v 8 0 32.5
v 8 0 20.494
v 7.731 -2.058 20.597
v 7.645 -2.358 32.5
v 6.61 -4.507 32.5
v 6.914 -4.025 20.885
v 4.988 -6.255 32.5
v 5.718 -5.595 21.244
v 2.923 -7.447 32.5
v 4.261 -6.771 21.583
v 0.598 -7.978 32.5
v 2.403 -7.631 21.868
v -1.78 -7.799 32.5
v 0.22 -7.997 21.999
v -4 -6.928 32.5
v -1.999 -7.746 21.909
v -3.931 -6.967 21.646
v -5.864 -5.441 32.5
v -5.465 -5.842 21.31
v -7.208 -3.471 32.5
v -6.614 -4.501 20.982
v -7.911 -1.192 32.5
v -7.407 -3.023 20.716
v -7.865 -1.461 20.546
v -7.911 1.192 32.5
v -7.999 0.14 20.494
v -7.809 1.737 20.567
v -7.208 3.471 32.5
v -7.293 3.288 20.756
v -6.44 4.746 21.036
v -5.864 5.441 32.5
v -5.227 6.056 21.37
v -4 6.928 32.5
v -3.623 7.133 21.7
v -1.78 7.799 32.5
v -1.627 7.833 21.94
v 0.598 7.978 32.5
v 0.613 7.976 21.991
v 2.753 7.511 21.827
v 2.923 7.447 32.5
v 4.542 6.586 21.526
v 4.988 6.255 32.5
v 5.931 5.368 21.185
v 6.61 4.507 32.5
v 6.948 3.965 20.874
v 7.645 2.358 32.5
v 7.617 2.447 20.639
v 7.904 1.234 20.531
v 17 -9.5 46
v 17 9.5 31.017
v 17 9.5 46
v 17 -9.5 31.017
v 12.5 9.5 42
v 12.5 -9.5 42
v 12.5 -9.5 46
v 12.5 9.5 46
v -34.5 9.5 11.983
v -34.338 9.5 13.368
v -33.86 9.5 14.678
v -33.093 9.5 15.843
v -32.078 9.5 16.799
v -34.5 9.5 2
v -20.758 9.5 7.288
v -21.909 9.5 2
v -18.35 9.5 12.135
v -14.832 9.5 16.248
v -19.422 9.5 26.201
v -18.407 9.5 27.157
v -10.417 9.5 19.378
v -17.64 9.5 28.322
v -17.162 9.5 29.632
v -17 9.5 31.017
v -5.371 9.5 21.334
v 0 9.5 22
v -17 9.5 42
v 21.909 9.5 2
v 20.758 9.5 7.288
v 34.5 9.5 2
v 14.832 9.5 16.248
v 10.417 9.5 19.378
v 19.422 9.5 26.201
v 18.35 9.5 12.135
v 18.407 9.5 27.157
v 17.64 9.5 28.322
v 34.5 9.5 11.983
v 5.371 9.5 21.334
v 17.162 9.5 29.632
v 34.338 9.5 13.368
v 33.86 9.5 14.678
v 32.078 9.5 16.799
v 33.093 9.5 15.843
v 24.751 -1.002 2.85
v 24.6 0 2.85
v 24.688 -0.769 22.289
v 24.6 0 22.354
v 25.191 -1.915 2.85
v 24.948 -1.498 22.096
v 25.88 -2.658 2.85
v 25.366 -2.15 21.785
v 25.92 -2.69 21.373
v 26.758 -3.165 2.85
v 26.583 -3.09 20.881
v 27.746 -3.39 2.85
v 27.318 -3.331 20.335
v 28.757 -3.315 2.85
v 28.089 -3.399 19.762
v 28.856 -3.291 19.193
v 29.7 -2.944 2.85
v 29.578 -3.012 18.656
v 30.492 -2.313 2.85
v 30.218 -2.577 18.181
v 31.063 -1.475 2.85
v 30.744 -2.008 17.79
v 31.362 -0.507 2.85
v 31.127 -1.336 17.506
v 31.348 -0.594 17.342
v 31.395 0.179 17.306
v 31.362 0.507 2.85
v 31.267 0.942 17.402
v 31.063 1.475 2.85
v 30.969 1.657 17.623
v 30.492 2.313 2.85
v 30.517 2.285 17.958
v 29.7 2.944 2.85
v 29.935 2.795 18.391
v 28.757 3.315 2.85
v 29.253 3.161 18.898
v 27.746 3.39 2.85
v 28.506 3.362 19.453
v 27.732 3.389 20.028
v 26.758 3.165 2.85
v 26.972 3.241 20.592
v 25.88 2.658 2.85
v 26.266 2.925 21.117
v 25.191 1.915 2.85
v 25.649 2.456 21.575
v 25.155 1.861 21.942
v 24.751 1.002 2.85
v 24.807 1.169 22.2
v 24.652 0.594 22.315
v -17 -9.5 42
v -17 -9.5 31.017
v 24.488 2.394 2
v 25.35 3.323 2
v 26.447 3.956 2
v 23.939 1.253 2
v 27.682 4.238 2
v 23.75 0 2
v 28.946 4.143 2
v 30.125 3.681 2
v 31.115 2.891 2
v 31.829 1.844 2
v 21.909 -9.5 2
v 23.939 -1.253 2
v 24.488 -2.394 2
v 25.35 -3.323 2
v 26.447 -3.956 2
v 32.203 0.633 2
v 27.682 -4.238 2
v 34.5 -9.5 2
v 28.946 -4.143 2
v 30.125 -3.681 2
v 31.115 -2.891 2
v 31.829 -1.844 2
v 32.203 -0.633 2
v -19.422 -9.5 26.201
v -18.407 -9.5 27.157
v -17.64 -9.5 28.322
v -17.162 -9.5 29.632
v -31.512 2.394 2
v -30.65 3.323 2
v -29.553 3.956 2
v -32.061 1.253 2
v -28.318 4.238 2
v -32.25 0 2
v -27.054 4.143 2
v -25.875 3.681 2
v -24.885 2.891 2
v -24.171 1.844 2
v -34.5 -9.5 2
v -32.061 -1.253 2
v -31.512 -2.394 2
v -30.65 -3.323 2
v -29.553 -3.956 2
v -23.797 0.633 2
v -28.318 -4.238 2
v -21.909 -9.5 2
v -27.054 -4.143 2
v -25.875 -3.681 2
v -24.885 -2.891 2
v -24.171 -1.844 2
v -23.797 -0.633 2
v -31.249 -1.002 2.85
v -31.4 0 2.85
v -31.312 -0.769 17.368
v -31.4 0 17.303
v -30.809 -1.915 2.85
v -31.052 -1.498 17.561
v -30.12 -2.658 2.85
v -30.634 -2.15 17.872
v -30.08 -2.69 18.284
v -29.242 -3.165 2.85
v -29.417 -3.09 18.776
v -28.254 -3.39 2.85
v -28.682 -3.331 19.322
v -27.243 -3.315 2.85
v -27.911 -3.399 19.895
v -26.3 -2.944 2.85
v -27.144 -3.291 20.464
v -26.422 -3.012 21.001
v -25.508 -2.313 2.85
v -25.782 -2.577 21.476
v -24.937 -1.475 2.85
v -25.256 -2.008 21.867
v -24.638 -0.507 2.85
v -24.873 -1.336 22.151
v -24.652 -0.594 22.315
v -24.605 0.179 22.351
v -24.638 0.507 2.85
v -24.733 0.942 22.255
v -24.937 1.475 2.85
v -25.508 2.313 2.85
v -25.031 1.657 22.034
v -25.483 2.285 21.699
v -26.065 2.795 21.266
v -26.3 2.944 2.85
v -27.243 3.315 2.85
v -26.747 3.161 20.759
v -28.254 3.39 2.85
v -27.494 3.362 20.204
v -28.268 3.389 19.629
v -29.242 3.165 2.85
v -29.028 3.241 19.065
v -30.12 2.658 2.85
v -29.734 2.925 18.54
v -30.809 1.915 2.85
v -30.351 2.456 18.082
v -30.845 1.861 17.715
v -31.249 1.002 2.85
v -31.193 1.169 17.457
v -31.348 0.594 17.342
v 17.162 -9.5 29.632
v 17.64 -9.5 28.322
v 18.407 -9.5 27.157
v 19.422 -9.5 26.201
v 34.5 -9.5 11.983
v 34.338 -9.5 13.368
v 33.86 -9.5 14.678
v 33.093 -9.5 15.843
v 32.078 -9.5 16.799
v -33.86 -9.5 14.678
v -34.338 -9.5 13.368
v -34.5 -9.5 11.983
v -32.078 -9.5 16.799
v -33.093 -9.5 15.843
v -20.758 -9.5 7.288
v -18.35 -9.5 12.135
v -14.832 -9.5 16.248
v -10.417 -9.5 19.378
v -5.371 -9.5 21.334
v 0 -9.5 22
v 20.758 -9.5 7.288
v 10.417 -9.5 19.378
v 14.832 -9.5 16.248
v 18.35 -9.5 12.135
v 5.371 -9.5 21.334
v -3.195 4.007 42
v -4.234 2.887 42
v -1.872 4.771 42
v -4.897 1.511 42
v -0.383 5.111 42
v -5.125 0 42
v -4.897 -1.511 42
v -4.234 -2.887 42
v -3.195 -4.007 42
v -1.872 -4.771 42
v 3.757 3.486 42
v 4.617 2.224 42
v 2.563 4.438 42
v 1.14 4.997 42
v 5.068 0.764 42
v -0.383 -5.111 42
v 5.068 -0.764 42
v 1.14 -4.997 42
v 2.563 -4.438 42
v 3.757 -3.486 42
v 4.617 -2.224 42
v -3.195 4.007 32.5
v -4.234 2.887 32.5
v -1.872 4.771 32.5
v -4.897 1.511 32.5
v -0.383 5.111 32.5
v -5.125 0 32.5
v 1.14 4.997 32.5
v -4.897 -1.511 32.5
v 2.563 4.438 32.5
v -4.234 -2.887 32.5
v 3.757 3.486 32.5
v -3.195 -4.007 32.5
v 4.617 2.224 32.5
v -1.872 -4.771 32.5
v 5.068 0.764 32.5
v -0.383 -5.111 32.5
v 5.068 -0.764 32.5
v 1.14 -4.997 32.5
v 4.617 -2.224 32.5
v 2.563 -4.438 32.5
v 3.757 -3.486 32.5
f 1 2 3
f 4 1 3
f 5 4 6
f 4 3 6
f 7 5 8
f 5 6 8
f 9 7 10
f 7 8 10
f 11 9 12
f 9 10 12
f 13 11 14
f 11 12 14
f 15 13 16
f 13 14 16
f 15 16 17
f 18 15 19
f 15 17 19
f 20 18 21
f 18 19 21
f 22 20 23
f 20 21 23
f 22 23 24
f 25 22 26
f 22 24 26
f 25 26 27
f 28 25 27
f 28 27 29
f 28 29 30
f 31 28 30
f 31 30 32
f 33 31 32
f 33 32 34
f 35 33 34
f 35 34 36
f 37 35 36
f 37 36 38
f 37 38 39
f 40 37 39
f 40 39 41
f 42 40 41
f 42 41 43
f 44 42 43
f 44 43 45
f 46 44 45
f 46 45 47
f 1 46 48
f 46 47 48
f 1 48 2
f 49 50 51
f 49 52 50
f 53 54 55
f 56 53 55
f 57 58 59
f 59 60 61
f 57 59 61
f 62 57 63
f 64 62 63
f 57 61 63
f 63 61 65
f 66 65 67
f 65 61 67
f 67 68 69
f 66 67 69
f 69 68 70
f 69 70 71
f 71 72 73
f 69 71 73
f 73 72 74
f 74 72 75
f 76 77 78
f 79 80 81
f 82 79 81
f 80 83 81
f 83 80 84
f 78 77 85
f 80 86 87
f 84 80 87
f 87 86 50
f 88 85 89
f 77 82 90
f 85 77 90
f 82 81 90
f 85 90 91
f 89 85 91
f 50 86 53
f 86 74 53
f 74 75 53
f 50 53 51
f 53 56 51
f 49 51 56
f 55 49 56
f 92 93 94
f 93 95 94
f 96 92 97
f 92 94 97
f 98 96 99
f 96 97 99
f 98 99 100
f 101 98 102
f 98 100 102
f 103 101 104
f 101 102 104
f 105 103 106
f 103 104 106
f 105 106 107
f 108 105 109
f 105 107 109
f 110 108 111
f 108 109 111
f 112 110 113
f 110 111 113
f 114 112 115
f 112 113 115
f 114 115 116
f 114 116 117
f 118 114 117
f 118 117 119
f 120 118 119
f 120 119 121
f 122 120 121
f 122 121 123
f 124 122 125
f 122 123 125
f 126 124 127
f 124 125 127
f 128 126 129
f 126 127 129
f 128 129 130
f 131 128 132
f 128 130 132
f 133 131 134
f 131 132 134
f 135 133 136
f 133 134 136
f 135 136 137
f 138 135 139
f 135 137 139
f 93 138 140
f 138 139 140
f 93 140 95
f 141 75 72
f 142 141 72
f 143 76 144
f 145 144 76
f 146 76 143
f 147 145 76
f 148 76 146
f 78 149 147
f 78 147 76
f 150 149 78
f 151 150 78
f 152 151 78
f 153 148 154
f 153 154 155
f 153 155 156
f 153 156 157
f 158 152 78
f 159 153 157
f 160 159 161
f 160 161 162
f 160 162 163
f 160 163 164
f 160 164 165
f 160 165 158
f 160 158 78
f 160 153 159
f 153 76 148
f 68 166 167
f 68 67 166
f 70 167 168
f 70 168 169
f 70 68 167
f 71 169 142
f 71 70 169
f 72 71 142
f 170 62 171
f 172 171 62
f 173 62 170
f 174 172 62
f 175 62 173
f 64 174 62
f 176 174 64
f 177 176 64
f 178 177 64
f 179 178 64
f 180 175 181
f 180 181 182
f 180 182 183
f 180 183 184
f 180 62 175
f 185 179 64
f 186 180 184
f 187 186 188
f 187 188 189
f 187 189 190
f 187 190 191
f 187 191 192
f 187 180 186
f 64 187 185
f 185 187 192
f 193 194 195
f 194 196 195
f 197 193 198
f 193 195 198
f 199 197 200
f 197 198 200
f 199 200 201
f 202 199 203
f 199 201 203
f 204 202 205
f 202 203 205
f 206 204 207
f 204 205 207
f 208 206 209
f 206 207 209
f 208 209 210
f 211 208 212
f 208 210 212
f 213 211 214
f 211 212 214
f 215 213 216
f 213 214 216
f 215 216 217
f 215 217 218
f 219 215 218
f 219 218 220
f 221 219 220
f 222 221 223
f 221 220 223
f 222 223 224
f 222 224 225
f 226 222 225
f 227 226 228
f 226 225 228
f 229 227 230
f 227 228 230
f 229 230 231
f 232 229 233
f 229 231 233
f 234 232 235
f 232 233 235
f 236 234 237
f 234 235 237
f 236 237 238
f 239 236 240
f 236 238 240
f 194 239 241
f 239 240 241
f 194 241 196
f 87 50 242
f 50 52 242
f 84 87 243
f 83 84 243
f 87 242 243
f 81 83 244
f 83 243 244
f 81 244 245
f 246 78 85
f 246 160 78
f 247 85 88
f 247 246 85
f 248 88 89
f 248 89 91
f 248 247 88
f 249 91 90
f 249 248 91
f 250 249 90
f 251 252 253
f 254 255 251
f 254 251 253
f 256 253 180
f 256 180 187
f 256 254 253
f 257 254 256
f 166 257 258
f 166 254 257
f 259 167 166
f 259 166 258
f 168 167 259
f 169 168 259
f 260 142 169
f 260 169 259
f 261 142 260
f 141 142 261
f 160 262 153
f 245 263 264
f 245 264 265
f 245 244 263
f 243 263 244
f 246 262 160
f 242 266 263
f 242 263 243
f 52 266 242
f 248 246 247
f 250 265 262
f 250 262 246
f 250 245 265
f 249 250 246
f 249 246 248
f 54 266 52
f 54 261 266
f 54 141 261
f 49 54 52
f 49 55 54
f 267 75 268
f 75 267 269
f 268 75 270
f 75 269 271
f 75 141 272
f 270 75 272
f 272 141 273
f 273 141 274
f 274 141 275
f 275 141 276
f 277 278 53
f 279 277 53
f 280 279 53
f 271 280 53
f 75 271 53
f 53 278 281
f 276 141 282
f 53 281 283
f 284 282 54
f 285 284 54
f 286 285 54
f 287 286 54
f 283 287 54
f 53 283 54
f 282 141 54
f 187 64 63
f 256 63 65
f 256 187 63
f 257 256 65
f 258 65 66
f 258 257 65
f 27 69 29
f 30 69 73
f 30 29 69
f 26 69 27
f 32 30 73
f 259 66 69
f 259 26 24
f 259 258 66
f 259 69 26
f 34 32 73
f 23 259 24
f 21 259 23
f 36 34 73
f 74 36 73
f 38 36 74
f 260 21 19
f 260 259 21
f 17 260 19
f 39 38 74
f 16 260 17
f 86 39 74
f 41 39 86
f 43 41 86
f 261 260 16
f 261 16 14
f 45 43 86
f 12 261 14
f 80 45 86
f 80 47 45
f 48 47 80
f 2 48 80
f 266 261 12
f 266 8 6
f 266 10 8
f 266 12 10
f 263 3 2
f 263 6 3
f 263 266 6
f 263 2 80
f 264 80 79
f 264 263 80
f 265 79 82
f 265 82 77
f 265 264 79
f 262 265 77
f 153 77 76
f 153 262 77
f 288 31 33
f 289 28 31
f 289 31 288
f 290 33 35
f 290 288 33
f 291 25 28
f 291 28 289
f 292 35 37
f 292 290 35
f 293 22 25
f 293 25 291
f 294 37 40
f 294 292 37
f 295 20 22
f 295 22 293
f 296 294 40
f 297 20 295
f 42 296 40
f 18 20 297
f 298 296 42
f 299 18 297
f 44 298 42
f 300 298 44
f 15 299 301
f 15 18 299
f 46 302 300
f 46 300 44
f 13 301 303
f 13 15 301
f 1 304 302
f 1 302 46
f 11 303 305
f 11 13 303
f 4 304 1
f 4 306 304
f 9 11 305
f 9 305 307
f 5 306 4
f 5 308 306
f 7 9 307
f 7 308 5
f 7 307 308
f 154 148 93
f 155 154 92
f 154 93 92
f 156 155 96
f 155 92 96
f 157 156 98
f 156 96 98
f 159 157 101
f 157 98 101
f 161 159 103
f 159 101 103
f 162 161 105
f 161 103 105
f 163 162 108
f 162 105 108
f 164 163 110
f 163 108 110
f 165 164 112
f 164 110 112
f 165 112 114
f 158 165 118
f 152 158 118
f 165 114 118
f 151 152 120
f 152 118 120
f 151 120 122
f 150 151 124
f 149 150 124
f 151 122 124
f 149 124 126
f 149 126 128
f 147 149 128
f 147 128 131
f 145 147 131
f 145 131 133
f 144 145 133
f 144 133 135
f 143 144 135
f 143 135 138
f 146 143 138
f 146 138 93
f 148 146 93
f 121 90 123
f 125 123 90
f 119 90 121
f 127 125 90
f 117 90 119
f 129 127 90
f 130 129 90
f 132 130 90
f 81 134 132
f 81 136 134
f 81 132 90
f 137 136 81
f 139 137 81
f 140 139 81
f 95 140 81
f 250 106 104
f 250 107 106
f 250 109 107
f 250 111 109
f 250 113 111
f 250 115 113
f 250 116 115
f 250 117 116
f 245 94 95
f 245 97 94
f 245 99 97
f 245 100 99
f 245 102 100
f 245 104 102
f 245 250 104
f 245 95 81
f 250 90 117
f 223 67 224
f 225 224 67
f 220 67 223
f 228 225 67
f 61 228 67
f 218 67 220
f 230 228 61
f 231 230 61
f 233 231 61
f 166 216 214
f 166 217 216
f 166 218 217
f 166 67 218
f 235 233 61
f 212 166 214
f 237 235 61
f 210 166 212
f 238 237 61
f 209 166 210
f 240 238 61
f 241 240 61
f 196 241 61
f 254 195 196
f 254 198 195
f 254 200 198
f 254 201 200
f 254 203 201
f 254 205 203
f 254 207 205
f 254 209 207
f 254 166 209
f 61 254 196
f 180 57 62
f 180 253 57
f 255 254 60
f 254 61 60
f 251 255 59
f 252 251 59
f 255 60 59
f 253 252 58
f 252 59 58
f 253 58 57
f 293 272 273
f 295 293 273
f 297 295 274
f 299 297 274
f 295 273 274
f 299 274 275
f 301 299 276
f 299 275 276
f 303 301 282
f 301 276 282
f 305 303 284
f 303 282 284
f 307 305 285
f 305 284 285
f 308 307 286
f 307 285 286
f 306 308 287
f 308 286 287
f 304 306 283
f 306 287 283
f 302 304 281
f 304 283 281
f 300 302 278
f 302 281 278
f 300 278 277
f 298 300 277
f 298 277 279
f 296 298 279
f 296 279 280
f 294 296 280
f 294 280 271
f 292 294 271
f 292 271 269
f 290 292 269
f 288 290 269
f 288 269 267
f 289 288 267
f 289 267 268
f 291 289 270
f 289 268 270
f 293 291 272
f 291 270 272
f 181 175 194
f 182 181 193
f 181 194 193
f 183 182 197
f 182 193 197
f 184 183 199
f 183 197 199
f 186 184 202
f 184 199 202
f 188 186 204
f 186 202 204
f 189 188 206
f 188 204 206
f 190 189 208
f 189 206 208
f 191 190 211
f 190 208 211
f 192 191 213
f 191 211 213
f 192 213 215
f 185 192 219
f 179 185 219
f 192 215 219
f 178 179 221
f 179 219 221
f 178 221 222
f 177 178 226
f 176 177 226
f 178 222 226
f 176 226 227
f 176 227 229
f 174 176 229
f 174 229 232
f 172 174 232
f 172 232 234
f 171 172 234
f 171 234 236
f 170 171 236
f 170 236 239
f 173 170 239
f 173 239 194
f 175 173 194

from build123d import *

# Parameters (mm, degrees)
F1_DEPTH       = 9.5
F3_D           = 6.8
F3_START       = 2
F3_CSINK_D     = 8.5
F3_CSINK_ANGLE = 90
F5_D           = 10.25
F5_START       = 22.0000001
F5_CBORE_D     = 16
F5_CBORE_DEPTH = 10.5
F6_W           = 29.5
F6_H           = 4
F7_DEPTH       = 19
F8_R           = 6
F9_R           = 6


with BuildPart() as f1:
    # F0 (on Front) → F1 (new body, symmetric)
    with BuildSketch(Plane.XZ):
        with BuildLine():
            Line((-34.5, 2), (-21.9089023002, 2))
            ThreePointArc((-21.9089023002, 2), (-14.8323969742, 16.2480768093), (0, 22))
            ThreePointArc((0, 22), (14.8323969742, 16.2480768093), (21.9089023002, 2))
            Line((21.9089023002, 2), (34.5, 2))
            Line((34.5, 2), (34.5, 15))
            Line((34.5, 15), (17, 28))
            Line((17, 28), (17, 46))
            Line((17, 46), (0, 46))
            Line((0, 46), (-17, 46))
            Line((-17, 46), (-17, 28))
            Line((-17, 28), (-34.5, 15))
            Line((-34.5, 15), (-34.5, 2))
        make_face()
    extrude(amount=F1_DEPTH, both=True)

    # F3 (through all)
    # its depths count from where the whole tool has entered the part; down to there all is cleared
    with Locations(Plane(origin=(0, 0, 0), x_dir=(1, 0, 0), z_dir=(0, 0, -1)).offset(-F3_START)):
        with Locations((28, 0), (-28, 0)):
            CounterSinkHole(F3_D / 2, F3_CSINK_D / 2, counter_sink_angle=F3_CSINK_ANGLE)

    # F5 (through all)
    # its depths count from where the whole tool has entered the part; down to there all is cleared
    with Locations(Plane(origin=(0, 0, 0), x_dir=(1, 0, 0), z_dir=(0, 0, -1)).offset(-F5_START)):
        with Locations((0, 0)):
            CounterBoreHole(F5_D / 2, F5_CBORE_D / 2, F5_CBORE_DEPTH)

    # F6 (on face) → F7 (cut)
    with BuildSketch(Plane.XZ.offset(9.5)):
        with Locations((-2.25, 44)):
            Rectangle(F6_W, F6_H)
    extrude(amount=-F7_DEPTH, mode=Mode.SUBTRACT)

    # F8
    f8_edges = [f1.edges().sort_by_distance(p)[0] for p in [
        (17, 0, 28),
        (-17, 0, 28),
    ]]
    fillet(f8_edges, radius=F8_R)

    # F9
    f9_edges = [f1.edges().sort_by_distance(p)[0] for p in [
        (34.5, 0, 15),
        (-34.5, 0, 15),
    ]]
    fillet(f9_edges, radius=F9_R)


solid = f1.part
